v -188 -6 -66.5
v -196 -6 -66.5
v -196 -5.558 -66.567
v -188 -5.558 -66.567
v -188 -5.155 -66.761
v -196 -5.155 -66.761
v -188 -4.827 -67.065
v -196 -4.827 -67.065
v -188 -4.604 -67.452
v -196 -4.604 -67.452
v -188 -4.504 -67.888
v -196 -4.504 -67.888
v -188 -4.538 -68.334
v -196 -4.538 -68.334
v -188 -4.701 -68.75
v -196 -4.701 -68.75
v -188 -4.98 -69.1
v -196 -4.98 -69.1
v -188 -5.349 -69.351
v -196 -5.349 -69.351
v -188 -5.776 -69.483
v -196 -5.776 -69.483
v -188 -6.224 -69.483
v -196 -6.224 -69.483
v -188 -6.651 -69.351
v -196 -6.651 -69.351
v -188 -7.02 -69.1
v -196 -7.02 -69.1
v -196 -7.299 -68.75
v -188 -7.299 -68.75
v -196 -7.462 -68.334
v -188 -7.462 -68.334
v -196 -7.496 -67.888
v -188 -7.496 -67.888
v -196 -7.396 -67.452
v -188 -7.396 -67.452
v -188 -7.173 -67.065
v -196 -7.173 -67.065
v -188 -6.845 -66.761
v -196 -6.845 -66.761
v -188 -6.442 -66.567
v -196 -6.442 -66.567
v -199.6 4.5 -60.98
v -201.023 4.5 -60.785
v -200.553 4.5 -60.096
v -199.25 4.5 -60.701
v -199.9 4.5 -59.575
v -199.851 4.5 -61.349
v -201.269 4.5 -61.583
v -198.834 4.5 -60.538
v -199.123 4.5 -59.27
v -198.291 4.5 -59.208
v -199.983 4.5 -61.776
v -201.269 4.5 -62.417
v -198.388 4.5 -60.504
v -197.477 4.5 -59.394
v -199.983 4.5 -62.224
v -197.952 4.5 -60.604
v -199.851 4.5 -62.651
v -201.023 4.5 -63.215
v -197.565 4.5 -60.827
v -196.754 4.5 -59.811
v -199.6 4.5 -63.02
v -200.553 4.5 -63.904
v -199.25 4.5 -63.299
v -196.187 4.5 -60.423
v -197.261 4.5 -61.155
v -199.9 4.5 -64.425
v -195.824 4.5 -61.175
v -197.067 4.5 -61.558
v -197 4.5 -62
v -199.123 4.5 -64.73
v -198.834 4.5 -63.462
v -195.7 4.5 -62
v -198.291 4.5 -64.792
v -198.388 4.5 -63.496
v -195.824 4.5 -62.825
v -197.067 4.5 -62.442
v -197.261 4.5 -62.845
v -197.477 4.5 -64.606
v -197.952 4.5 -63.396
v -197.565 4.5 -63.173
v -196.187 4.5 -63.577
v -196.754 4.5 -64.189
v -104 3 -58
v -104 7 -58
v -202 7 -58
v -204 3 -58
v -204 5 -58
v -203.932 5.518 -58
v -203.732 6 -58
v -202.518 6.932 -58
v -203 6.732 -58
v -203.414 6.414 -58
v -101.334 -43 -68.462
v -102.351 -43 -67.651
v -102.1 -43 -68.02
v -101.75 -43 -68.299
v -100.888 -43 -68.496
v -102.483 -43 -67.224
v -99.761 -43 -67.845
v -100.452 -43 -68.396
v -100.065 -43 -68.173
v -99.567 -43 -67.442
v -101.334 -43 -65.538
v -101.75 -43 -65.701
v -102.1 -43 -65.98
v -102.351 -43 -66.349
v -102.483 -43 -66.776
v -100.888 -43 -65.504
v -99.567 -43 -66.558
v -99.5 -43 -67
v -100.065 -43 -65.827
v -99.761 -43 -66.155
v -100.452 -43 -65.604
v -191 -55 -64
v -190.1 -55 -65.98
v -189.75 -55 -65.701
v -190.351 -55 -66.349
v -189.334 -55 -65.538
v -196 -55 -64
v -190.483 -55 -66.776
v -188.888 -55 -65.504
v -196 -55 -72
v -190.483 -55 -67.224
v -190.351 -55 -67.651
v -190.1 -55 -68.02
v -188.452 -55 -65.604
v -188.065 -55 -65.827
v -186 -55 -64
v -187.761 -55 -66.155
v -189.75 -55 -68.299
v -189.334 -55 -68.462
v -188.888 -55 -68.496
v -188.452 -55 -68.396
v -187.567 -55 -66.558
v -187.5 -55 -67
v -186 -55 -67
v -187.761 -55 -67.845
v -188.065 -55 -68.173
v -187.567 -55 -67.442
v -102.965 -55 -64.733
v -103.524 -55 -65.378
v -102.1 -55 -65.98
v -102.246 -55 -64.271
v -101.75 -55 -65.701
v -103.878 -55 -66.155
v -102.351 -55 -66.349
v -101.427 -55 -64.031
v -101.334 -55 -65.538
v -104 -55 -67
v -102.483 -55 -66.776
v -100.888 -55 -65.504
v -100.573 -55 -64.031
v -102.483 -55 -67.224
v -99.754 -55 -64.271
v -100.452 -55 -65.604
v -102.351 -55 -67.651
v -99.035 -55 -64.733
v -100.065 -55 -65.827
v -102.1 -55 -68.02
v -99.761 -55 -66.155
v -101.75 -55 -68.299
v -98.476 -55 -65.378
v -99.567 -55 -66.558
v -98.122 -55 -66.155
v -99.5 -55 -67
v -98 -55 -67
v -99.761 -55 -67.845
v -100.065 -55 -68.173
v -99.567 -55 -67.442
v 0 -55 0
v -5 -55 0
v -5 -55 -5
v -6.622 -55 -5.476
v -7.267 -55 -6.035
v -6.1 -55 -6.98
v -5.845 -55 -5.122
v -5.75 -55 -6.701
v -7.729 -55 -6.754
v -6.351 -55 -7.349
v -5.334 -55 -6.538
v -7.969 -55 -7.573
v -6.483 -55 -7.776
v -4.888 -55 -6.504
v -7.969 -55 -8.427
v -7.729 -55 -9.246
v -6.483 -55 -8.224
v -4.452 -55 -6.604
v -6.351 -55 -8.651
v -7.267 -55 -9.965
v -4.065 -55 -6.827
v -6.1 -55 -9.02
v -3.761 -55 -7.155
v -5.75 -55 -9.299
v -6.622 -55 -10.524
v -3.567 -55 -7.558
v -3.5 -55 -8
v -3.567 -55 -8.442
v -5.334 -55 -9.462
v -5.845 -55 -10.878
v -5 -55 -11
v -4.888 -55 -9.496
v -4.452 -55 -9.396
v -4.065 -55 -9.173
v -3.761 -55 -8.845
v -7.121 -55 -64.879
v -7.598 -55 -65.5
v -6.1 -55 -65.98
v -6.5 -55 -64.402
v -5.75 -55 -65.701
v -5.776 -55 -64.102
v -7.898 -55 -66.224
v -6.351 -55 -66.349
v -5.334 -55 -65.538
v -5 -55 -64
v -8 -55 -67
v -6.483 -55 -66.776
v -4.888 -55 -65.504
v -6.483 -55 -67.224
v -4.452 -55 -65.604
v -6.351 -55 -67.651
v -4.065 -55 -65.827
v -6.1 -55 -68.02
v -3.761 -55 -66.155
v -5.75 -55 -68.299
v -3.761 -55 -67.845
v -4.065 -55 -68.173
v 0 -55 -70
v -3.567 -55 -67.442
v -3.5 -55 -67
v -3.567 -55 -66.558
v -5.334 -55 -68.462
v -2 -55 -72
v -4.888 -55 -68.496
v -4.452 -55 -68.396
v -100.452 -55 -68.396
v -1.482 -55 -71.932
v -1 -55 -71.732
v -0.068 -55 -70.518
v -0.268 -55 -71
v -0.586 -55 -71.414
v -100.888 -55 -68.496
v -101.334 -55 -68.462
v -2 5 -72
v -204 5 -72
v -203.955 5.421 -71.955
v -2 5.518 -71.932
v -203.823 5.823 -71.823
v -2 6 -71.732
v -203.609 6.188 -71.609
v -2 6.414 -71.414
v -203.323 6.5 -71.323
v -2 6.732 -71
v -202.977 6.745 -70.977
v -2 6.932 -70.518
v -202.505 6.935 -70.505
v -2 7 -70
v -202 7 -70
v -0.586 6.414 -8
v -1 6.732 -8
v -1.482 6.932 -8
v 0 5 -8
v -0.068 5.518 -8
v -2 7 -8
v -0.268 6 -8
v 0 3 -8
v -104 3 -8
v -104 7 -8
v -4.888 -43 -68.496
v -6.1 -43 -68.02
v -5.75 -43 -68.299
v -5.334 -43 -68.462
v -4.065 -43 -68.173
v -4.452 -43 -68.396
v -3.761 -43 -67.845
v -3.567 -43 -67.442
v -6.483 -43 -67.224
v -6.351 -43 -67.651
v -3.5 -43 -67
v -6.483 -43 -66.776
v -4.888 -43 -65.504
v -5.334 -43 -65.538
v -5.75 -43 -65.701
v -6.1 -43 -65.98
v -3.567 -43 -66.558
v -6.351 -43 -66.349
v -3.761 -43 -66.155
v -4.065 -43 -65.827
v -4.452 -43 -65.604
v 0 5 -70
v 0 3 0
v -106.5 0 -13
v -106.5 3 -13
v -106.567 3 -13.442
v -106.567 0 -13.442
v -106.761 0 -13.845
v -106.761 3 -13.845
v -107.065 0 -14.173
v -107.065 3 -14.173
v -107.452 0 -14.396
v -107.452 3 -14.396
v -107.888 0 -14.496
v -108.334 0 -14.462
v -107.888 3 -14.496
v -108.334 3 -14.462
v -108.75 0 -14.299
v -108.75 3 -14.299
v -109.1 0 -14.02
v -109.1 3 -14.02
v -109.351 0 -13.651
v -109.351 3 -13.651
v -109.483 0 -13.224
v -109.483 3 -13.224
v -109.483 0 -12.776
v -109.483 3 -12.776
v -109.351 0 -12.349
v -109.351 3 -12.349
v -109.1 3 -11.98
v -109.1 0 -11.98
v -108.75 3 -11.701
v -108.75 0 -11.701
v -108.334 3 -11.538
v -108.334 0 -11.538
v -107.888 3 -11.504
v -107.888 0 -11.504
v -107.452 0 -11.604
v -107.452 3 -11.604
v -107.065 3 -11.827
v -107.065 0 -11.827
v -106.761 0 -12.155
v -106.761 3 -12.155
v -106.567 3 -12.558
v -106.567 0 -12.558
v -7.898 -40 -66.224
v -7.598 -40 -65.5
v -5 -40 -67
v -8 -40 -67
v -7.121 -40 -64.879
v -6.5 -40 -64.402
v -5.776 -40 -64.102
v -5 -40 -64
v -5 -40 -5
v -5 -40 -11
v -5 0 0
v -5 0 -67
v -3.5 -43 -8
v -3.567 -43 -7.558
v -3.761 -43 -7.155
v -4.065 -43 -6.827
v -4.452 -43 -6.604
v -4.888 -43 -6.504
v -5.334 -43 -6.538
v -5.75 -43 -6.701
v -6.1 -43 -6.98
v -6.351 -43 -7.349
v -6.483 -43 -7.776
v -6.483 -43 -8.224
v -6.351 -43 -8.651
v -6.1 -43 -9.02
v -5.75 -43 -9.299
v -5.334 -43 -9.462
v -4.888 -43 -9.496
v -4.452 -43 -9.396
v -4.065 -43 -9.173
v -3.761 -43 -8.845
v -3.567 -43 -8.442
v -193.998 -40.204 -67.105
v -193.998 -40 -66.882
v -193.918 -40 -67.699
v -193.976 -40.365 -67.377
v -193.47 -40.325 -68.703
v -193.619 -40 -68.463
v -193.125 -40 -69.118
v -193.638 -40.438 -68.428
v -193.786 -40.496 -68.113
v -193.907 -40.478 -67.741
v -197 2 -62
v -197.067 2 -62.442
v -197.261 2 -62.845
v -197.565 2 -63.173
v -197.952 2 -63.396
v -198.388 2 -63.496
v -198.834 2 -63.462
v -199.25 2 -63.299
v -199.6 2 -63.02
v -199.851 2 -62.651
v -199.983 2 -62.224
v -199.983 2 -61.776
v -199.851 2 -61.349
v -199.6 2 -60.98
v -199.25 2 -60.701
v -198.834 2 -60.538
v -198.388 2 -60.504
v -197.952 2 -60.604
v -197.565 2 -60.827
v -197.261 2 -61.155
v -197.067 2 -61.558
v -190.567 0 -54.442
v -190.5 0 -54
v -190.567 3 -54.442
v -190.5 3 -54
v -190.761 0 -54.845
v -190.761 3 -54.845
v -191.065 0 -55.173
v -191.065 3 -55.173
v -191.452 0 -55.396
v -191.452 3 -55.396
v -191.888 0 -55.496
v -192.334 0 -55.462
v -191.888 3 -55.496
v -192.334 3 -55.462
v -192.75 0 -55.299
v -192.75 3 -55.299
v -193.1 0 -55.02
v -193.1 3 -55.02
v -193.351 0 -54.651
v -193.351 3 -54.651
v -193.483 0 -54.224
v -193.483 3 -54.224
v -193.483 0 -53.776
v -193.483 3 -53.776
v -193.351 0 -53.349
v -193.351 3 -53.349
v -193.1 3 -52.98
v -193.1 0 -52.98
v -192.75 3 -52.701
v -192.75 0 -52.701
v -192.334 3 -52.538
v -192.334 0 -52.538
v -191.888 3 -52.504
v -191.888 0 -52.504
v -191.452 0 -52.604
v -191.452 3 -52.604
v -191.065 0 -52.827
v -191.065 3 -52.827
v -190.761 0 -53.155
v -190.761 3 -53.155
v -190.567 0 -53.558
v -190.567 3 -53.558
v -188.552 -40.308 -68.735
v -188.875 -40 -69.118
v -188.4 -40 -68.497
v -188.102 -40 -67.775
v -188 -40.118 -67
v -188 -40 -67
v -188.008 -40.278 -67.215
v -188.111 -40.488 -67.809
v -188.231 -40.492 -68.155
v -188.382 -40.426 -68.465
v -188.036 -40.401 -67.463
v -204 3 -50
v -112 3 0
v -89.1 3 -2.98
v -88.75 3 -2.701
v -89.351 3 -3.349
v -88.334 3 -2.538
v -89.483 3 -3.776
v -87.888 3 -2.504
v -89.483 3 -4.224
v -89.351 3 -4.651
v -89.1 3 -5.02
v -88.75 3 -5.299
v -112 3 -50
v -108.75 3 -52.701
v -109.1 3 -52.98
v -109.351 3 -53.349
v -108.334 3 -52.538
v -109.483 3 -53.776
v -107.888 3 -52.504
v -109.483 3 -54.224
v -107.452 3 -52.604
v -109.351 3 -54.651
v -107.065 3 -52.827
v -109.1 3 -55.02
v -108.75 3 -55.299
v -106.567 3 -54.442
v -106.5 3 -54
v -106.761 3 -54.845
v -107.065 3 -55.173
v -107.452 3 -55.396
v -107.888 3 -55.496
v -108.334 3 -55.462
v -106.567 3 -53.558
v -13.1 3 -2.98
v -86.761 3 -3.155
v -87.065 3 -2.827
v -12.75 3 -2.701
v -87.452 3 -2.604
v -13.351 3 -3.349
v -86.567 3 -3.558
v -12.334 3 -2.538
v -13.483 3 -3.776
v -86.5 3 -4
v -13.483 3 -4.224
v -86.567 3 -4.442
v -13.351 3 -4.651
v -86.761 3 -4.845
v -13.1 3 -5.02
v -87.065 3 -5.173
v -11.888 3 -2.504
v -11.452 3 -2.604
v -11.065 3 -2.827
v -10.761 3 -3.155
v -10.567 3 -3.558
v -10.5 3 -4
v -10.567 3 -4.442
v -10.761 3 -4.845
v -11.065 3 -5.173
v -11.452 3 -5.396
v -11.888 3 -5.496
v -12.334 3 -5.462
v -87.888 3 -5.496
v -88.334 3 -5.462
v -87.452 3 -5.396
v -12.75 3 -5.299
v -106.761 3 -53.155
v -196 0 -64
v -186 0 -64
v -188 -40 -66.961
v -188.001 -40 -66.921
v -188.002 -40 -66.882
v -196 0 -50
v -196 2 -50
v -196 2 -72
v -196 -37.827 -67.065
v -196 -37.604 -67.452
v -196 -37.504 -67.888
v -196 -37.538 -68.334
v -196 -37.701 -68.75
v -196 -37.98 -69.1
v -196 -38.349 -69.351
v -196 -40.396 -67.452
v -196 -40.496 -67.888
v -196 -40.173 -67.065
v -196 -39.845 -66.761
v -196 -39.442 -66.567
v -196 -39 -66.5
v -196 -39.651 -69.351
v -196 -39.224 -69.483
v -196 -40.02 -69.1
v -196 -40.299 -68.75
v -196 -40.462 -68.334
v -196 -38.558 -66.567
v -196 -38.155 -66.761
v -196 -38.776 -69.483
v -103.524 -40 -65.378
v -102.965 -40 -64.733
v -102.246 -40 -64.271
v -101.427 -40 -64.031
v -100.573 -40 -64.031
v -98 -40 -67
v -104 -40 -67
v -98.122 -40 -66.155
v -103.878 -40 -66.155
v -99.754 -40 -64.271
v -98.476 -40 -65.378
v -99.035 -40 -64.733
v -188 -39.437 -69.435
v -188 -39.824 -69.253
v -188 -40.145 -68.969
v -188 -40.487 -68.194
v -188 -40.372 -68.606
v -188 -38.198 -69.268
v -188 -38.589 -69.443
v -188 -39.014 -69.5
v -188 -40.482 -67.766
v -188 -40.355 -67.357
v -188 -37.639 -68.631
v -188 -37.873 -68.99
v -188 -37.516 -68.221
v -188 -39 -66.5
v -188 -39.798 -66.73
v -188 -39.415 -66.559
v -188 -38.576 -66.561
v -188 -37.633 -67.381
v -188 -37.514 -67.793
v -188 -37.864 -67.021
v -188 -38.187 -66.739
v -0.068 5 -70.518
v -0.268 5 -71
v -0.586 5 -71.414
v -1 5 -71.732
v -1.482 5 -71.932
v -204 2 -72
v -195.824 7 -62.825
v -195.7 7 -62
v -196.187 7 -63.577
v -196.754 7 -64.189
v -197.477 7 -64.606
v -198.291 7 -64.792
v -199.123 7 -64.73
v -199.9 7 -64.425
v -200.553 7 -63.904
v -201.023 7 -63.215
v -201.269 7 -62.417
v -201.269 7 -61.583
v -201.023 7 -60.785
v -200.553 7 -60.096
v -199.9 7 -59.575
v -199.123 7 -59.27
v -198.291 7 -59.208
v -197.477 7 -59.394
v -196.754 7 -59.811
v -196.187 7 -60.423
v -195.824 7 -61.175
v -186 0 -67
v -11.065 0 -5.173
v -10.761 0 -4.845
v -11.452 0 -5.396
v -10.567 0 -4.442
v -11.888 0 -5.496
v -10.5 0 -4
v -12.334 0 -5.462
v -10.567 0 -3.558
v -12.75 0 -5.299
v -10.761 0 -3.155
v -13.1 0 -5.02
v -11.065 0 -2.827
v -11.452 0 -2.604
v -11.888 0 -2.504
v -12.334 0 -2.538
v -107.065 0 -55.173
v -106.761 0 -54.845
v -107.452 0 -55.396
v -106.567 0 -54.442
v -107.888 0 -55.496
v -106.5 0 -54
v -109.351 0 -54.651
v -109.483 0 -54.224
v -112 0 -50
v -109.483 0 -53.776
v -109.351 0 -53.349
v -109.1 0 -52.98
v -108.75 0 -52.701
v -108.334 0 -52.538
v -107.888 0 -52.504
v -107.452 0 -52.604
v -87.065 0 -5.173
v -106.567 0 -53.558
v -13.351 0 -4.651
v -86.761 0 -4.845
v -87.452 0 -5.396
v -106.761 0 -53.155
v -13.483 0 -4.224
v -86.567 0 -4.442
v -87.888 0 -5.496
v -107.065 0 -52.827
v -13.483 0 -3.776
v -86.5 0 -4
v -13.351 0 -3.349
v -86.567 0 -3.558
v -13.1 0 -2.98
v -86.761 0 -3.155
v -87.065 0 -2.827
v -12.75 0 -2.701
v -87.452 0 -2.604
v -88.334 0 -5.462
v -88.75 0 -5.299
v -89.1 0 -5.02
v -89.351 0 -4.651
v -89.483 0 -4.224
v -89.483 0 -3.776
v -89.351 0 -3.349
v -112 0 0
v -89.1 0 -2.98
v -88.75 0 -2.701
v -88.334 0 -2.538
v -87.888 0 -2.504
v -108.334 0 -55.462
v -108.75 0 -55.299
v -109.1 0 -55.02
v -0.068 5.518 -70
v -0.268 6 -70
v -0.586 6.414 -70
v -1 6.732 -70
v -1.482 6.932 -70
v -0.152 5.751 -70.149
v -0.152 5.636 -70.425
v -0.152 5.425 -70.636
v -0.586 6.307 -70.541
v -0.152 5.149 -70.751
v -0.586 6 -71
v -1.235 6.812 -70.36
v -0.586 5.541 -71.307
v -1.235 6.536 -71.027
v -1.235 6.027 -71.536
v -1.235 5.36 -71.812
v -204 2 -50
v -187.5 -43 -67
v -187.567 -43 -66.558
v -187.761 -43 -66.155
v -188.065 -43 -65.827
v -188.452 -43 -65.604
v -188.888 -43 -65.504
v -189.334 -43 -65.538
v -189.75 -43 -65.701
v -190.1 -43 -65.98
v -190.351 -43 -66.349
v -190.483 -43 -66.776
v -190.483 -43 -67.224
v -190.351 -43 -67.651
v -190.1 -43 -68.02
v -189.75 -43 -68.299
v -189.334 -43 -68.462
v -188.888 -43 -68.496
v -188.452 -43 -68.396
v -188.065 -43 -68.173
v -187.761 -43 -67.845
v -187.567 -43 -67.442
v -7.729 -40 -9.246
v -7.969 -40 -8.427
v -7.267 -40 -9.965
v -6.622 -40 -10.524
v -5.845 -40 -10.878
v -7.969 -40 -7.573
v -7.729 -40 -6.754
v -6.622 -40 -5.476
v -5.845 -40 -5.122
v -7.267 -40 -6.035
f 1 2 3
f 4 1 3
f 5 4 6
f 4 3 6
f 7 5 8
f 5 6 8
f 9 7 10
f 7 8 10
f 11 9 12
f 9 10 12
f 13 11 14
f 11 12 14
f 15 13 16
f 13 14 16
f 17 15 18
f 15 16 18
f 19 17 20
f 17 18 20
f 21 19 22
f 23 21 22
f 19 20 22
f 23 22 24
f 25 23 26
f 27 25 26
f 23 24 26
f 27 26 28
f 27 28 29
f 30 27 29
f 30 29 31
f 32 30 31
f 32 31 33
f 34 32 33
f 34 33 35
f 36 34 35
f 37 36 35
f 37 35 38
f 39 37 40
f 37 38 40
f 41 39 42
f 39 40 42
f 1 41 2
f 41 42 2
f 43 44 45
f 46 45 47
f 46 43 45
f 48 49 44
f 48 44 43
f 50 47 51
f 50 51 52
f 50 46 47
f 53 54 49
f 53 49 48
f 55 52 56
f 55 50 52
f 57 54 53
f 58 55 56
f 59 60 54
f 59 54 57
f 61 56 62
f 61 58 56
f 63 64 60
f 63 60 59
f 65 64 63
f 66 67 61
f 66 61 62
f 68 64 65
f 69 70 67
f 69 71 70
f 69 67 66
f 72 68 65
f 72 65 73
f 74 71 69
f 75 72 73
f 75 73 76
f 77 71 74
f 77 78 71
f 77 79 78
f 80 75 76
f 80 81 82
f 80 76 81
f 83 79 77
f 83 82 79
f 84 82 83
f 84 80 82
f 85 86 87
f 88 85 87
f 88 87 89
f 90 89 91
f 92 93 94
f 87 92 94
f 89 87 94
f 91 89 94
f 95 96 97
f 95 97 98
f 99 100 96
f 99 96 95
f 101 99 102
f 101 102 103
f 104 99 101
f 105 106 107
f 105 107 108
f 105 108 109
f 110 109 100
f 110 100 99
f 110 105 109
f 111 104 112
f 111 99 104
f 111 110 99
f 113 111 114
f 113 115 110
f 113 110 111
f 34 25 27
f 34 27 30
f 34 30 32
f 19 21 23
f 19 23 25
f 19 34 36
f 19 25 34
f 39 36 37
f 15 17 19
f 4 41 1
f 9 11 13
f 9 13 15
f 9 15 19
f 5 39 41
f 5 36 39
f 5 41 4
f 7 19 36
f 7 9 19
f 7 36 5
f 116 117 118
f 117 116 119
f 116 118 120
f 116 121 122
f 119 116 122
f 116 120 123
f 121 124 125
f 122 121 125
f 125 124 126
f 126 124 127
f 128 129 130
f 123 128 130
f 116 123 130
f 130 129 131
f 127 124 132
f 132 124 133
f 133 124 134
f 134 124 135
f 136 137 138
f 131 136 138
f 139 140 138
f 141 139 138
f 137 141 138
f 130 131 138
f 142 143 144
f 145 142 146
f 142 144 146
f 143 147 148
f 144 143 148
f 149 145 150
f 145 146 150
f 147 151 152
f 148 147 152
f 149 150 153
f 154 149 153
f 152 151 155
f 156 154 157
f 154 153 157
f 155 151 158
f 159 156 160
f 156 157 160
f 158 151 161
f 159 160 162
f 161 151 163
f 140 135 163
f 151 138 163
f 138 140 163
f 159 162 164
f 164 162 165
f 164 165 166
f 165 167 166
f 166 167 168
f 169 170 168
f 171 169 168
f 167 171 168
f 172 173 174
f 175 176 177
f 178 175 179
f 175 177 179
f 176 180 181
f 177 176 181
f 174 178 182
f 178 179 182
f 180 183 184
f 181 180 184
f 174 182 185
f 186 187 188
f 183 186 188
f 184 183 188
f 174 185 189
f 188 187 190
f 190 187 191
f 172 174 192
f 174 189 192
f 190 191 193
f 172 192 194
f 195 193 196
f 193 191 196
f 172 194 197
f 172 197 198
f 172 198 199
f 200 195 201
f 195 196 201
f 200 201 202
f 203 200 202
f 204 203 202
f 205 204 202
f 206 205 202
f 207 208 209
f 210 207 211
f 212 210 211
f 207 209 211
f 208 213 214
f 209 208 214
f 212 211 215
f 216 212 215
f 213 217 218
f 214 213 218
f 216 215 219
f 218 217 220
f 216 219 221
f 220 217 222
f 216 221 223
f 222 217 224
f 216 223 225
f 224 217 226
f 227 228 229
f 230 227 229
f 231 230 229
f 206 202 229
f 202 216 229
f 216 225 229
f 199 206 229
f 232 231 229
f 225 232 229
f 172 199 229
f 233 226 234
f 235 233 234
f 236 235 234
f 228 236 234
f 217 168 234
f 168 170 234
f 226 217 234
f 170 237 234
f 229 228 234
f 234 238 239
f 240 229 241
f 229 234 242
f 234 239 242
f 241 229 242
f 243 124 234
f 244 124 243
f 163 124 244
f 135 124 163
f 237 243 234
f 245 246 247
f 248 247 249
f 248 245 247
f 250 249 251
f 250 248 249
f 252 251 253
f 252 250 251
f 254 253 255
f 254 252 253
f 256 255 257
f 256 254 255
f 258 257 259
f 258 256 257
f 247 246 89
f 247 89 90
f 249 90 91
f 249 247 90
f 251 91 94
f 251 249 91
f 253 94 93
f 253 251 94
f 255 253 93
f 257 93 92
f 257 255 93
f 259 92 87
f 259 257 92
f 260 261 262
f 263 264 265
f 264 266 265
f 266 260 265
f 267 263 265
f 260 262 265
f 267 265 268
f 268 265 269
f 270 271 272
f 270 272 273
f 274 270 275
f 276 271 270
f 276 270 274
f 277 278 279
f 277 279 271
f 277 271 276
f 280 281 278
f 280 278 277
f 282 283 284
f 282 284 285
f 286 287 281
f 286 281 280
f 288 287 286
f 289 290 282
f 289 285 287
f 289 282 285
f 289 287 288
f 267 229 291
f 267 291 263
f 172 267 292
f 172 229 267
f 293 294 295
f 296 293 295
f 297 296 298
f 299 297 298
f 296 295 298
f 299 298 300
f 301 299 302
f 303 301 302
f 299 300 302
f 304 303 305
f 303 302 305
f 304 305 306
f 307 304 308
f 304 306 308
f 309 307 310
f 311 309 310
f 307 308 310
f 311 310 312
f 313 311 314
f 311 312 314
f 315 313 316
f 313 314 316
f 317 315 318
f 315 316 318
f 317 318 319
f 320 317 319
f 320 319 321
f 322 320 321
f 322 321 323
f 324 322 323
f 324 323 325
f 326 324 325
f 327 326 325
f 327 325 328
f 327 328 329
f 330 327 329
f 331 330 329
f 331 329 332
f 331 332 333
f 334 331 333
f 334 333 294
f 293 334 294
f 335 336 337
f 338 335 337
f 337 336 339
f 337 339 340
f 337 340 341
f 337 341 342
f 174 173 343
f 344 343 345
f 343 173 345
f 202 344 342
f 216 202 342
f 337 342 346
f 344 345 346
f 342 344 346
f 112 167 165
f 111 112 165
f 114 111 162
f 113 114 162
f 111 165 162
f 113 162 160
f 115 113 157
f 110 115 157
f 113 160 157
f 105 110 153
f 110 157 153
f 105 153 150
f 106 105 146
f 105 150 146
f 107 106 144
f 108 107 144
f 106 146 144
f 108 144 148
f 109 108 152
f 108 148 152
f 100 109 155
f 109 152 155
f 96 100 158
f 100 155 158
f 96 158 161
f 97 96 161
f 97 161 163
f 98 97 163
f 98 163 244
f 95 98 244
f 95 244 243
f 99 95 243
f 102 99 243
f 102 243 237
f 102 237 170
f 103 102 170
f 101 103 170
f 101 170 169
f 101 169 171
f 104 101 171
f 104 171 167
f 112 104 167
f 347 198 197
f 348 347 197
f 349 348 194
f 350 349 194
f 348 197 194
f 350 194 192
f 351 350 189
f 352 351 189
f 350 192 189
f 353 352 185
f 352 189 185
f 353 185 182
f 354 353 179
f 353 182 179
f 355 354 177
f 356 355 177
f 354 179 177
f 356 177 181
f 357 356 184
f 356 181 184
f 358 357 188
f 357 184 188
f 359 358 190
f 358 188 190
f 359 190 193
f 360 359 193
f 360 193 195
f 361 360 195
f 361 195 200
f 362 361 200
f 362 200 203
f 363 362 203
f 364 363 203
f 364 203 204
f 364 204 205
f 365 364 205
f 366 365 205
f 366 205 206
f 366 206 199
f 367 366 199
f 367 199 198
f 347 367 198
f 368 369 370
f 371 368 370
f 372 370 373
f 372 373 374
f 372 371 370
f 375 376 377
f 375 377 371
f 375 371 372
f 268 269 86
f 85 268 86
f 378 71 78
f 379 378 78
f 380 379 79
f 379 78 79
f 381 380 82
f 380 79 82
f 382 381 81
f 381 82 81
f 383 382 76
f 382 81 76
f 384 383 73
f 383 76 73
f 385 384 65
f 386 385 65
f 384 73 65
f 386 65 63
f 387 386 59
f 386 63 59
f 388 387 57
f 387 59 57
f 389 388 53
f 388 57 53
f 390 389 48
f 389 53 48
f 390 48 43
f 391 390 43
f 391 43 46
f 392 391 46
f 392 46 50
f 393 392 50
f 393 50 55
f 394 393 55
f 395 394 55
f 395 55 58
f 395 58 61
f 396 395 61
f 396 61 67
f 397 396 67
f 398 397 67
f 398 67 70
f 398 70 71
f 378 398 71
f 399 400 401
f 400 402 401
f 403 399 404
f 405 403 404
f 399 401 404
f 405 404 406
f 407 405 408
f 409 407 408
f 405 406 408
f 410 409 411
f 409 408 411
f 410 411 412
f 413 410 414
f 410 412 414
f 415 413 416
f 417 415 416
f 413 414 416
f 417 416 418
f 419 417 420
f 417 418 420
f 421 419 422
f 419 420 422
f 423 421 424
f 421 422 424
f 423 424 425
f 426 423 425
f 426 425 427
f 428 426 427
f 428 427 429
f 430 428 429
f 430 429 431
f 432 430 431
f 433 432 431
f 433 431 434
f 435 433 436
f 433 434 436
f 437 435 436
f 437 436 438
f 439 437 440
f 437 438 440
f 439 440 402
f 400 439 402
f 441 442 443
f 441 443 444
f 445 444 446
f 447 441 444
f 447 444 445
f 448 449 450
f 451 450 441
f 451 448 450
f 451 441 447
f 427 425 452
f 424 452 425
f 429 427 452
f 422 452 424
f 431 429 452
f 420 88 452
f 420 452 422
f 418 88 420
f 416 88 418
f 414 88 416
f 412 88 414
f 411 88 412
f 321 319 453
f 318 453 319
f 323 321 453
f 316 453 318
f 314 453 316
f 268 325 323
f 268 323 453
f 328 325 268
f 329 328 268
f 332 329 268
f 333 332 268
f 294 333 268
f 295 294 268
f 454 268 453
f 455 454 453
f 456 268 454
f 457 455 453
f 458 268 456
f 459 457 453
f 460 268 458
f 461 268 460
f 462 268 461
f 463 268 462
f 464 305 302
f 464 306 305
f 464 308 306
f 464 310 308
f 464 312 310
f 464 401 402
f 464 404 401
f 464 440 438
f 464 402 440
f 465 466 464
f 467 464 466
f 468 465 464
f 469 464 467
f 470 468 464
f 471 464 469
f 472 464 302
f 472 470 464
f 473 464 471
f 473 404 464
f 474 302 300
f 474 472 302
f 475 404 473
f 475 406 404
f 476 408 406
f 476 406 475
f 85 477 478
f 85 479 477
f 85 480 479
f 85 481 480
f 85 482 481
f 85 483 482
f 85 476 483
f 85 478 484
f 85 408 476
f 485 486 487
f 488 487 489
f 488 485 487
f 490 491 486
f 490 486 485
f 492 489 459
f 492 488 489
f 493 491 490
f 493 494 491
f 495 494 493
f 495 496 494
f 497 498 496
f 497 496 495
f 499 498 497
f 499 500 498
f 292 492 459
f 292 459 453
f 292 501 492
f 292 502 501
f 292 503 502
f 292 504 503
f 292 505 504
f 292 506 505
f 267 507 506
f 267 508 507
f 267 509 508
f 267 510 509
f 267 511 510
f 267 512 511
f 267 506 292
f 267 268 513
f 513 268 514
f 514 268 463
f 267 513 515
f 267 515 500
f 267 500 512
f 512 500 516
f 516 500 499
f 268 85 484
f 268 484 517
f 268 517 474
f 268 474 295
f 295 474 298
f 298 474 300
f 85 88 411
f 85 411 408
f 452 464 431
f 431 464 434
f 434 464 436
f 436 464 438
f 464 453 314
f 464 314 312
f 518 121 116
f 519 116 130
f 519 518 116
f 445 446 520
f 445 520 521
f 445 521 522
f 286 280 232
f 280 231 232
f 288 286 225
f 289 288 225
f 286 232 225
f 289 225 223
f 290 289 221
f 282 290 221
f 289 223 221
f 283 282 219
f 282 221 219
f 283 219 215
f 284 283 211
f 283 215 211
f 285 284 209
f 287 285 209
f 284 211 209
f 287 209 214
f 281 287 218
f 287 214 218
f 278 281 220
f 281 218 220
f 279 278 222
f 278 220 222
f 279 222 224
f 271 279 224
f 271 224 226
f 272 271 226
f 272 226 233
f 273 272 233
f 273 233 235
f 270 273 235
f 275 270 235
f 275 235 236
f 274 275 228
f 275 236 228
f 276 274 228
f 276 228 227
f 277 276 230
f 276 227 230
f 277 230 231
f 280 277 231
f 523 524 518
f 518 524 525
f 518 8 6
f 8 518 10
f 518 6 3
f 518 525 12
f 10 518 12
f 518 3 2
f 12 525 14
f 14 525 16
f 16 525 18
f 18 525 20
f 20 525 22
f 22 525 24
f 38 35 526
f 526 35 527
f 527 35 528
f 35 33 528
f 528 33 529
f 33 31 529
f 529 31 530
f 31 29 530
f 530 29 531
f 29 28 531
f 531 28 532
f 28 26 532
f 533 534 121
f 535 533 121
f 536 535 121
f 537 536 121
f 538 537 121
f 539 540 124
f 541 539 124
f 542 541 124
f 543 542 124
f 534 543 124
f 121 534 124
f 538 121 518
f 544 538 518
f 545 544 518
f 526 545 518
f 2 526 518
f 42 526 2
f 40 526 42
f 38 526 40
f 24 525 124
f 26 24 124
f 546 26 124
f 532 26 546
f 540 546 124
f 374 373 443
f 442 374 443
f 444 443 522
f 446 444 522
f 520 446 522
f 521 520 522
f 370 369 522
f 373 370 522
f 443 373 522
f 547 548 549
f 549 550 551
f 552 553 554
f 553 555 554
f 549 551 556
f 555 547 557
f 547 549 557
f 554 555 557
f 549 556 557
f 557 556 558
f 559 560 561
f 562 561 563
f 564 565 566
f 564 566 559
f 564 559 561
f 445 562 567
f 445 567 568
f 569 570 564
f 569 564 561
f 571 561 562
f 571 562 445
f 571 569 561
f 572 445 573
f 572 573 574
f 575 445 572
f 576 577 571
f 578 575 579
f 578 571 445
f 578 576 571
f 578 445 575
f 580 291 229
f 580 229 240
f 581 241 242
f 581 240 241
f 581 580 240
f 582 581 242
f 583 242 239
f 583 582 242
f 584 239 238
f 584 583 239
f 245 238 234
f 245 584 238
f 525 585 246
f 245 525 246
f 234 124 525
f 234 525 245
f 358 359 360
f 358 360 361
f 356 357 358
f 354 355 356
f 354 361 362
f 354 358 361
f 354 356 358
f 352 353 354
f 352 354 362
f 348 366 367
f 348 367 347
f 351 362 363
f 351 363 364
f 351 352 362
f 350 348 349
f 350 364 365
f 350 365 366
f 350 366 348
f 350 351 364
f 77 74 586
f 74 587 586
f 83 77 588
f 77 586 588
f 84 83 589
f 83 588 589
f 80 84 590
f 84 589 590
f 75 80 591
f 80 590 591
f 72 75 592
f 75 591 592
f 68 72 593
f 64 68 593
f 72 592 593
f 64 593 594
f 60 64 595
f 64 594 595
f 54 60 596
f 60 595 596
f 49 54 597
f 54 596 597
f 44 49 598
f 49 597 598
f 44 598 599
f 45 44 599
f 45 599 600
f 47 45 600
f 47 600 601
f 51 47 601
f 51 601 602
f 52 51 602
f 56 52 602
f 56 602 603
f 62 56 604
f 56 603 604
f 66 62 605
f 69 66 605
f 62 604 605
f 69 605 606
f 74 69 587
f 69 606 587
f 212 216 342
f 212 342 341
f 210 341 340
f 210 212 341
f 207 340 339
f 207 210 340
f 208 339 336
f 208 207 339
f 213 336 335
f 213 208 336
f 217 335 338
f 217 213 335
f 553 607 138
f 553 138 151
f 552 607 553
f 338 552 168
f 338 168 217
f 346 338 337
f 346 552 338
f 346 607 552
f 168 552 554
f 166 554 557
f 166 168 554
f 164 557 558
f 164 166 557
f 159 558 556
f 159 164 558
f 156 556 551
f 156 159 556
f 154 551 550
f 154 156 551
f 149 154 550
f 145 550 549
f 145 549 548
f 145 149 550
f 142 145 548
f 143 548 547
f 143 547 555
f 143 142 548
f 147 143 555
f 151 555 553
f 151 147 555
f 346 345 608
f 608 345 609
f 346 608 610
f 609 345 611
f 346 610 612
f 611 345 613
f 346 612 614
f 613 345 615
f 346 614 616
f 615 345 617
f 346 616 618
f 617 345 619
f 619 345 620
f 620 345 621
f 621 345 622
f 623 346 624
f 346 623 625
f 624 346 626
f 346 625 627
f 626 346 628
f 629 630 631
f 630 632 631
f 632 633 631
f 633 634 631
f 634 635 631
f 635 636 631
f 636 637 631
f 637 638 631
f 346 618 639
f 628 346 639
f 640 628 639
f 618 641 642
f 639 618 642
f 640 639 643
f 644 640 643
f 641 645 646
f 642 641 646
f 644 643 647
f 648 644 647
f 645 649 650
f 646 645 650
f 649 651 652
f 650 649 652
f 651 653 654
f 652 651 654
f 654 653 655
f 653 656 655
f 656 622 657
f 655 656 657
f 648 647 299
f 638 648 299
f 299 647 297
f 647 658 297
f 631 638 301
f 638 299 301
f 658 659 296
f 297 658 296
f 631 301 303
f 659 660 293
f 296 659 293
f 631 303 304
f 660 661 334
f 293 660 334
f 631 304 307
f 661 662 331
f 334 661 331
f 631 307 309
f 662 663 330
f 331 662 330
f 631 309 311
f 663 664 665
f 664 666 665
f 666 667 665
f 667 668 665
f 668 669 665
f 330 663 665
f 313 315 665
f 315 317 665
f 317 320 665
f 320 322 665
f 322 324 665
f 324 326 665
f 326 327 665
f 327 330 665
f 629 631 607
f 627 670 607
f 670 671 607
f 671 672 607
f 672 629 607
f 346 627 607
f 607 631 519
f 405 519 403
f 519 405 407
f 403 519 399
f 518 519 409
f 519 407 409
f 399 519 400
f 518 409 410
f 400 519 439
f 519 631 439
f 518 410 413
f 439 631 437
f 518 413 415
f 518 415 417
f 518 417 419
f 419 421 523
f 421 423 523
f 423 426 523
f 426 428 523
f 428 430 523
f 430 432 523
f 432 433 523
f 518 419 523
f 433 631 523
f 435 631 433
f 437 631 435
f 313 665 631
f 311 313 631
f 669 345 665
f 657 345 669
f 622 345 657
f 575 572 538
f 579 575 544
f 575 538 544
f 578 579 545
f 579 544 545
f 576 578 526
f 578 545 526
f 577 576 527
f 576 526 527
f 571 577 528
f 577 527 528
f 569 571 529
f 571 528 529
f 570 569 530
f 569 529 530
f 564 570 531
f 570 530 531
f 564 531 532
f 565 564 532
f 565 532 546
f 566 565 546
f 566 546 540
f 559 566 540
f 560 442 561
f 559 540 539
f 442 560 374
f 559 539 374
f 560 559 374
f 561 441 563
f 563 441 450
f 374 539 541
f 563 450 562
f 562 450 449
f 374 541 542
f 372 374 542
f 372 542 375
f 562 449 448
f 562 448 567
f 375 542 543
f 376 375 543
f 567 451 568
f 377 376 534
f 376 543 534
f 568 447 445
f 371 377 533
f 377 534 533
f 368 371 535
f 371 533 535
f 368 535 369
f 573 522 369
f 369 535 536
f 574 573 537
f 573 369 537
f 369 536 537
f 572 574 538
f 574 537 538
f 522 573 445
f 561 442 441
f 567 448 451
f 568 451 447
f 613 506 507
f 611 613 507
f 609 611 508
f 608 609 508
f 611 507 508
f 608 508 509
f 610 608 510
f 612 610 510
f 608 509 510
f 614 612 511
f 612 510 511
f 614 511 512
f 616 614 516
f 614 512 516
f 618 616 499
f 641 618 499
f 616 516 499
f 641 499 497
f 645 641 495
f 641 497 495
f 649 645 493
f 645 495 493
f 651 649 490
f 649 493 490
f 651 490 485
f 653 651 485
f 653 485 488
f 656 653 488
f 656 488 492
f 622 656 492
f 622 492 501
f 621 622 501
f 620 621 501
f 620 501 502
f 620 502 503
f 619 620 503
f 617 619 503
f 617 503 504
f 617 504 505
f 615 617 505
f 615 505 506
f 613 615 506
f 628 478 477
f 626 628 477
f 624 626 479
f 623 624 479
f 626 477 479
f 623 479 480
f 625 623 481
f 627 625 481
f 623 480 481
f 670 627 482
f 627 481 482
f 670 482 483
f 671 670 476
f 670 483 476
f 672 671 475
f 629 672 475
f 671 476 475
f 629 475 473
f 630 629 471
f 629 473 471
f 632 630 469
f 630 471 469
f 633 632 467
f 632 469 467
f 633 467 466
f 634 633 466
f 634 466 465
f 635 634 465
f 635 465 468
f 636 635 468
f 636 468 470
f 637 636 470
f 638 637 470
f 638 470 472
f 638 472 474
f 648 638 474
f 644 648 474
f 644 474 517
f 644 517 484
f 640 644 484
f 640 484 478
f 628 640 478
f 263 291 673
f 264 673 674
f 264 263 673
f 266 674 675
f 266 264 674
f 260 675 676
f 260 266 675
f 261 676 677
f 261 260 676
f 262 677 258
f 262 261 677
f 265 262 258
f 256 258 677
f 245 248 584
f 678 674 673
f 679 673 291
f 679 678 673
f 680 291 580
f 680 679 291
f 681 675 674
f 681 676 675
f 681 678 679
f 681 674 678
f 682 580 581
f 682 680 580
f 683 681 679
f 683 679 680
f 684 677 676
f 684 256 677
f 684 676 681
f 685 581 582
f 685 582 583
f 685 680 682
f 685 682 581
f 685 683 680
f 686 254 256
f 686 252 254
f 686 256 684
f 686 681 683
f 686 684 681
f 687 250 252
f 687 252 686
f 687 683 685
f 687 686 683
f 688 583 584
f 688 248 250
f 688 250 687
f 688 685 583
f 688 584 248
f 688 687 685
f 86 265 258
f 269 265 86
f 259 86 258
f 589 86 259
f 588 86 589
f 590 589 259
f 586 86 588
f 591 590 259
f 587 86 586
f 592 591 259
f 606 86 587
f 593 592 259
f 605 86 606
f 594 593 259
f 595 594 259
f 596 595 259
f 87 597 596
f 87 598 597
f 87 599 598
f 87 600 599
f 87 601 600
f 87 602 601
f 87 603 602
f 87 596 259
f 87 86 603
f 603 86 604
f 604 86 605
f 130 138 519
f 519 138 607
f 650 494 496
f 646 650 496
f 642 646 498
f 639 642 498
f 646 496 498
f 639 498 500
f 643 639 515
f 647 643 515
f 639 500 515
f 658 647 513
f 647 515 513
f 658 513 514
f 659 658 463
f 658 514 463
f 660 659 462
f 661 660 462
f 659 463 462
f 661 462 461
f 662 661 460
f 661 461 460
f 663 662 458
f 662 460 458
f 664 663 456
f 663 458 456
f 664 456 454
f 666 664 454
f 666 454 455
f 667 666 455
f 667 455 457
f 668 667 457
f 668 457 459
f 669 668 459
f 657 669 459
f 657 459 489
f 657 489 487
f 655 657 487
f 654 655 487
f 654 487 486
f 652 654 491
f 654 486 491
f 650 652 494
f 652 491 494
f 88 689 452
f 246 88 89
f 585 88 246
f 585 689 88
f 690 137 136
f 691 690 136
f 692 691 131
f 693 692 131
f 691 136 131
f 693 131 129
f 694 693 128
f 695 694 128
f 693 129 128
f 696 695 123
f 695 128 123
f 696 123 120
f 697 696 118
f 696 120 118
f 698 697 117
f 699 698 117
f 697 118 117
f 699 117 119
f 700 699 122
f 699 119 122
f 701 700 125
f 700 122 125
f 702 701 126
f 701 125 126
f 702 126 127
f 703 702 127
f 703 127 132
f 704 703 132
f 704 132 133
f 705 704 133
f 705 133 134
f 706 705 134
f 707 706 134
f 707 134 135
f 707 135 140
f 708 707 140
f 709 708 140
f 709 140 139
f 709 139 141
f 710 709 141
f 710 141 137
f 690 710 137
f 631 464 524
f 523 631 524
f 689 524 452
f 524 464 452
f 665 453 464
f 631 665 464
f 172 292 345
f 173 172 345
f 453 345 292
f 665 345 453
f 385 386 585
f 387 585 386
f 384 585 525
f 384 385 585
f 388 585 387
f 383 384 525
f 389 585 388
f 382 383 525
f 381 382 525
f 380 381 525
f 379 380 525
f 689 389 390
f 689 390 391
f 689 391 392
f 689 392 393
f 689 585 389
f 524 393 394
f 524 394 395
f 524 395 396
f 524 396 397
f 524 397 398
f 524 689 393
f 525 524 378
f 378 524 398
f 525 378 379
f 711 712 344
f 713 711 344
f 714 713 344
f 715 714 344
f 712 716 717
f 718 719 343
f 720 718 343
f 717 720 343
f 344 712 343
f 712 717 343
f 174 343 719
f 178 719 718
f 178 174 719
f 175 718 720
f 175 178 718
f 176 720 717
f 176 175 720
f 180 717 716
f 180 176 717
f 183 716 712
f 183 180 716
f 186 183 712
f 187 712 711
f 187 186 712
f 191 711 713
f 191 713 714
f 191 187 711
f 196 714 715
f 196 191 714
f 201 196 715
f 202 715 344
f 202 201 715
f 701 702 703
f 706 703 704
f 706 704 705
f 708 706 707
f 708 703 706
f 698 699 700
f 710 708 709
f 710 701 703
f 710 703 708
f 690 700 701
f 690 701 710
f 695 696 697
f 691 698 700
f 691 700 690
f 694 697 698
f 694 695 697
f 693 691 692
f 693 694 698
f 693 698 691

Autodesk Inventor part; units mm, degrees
ref_plane "YZ Plane" through (0, 0, 0) normal (1, 0, 0) x (0, 1, 0)
ref_plane "XZ Plane" through (0, 0, 0) normal (0, 1, 0) x (-1, 0, 0)
ref_plane "XY Plane" through (0, 0, 0) normal (0, 0, 1) x (1, 0, 0)
sketch "スケッチ1" plane through (0, 0, 0) normal (0, 1, 0) x (-1, 0, 0)
  line L0 (0, 0) -> (204, 0)
  line L1 (204, 0) -> (204, -72)
  line L2 (204, -72) -> (0, -72)
  line L3 (0, -72) -> (0, 0)
  dimension "d0" = 204
  dimension "d1" = 72
extrude "押し出し1" add sketch "スケッチ1" along normal blind 7
sketch "スケッチ2" plane through (0, 7, 0) normal (0, 1, 0) x (1, 0, 0)
  line L0 (-204, 72) -> (-204, 0) projected
  line L1 (-204, 0) -> (-112, 0)
  line L2 (-112, 0) -> (-112, 50)
  line L3 (-112, 50) -> (-204, 50)
  line L4 (-204, 50) -> (-204, 0)
  point P0 (0, 0)
  dimension "d4" = 92
  dimension "d5" = 50
extrude "押し出し2" cut sketch "スケッチ2" against normal through all
sketch "スケッチ3" plane through (0, 7, 0) normal (0, 1, 0) x (1, 0, 0)
  line L0 (-112, 0) -> (0, 0) projected
  line L1 (0, 0) -> (0, 72) projected
  line L2 (-112, 0) -> (0, 0)
  line L3 (0, 0) -> (0, 8)
  line L4 (0, 8) -> (-112, 8)
  line L5 (-112, 8) -> (-112, 0)
  line L6 (-112, 0) -> (-104, 0)
  line L7 (-104, 0) -> (-104, 58)
  line L8 (-104, 58) -> (-112, 58)
  line L9 (-112, 58) -> (-112, 0)
  line L10 (-204, 72) -> (-204, 50) projected
  line L11 (-204, 50) -> (-104, 50)
  line L12 (-104, 50) -> (-104, 58)
  line L13 (-104, 58) -> (-204, 58)
  line L14 (-204, 58) -> (-204, 50)
  point P0 (-112, 50)
  point P1 (-112, 8)
  point P2 (-104, 8)
  dimension "d8" = 8
  dimension "d11" = 8
  dimension "d12" = 8
extrude "押し出し3" cut sketch "スケッチ3" against normal blind 4
sketch "スケッチ4" plane through (0, 3, 0) normal (0, 1, 0) x (1, 0, 0)
  circle A0 centre (-192, 54) radius 1.5
  circle A1 centre (-108, 54) radius 1.5
  circle A2 centre (-108, 13) radius 1.5
  circle A3 centre (-12, 4) radius 1.5
  circle A4 centre (-88, 4) radius 1.5
  line L0 (-204, 50) -> (-204, 58) projected
  line L1 (0, 8) -> (0, 0) projected
  line L2 (-112, 0) -> (-112, 50) projected
  point P0 (-204, 54)
  point P1 (-204, 54)
  point P2 (0, 4)
  point P3 (0, 4)
  dimension "d13" = 3
  dimension "d14" = 3
  dimension "d15" = 3
  dimension "d16" = 3
  dimension "d17" = 3
  dimension "d18" = 12
  dimension "d19" = 12
  dimension "d20" = 24
  dimension "d21" = 4
  dimension "d22" = 41
extrude "押し出し4" cut sketch "スケッチ4" against normal through all
sketch "スケッチ5" plane through (0, 0, 0) normal (0, -1, 0) x (1, 0, 0)
  line L0 (-112, -50) -> (-204, -50) projected
  line L1 (0, -72) -> (-204, -72) projected
  line L2 (-204, -50) -> (-196, -50)
  line L3 (-196, -50) -> (-196, -72)
  line L4 (-196, -72) -> (-204, -72)
  line L5 (-204, -72) -> (-204, -50)
  point P0 (0, 0)
  point P1 (-204, -72)
  dimension "d25" = 8
extrude "押し出し5" cut sketch "スケッチ5" against normal blind 2
sketch "スケッチ6" plane through (0, 0, 0) normal (0, -1, 0) x (1, 0, 0)
  line L0 (0, -72) -> (-204, -72) projected
  line L1 (-196, -50) -> (-196, -72) projected
  line L2 (0, -72) -> (-196, -72)
  line L3 (-196, -72) -> (-196, -67)
  line L4 (-196, -67) -> (0, -67)
  line L5 (0, -67) -> (0, -72)
  line L6 (0, 0) -> (-5, 0)
  line L7 (-5, 0) -> (-5, -72)
  line L8 (-5, -72) -> (0, -72)
  line L9 (0, -72) -> (0, 0)
  point P0 (-5, -67)
  dimension "d28" = 5
  dimension "d29" = 5
extrude "押し出し6" add sketch "スケッチ6" along normal blind 55
sketch "スケッチ7" plane through (-196, 0, -67) normal (0, 0, 1) x (1, 0, 0)
  line L0 (0, 2) -> (0, -55) projected
  line L1 (0, 0) -> (191, 0) projected
  line L2 (0, -55) -> (10, -55)
  line L3 (10, -55) -> (10, 0)
  line L4 (10, 0) -> (0, 0)
  line L5 (0, 0) -> (0, -55)
  point P0 (196, 0)
  dimension "d32" = 10
extrude "押し出し7" add sketch "スケッチ7" along normal blind 3
sketch "スケッチ8" plane through (-196, 2, -72) normal (-1, 0, 0) x (0, 0, 1)
  circle A0 centre (4, -41) radius 1.5
  circle A1 centre (4, -8) radius 1.5
  line L0 (0, -57) -> (8, -57) projected
  line L1 (0, 0) -> (22, 0) projected
  point P0 (72, -2)
  point P1 (4, -57)
  point P2 (4, -57)
  point P3 (4, -57)
  dimension "d35" = 3
  dimension "d36" = 3
  dimension "d37" = 16
  dimension "d38" = 8
extrude "押し出し8" cut sketch "スケッチ8" against normal blind 8
sketch "スケッチ9" plane through (0, -55, 0) normal (0, -1, 0) x (1, 0, 0)
  line L0 (-5, -67) -> (-5, 0) projected
  circle A0 centre (-5, -8) radius 3
  circle A1 centre (-5, -67) radius 3
  line L1 (-186, -67) -> (-5, -67) projected
  circle A2 centre (-101, -67) radius 3
  circle A3 centre (-191, -67) radius 3
  line L2 (0, 0) -> (-5, 0) projected
  dimension "d41" = 6
  dimension "d42" = 6
  dimension "d43" = 6
  dimension "d44" = 6
  dimension "d46" = 96
  dimension "d47" = 90
  dimension "d73" = 8
extrude "押し出し9" add sketch "スケッチ9" against normal blind 15
sketch "スケッチ10" plane through (0, -55, 0) normal (0, -1, 0) x (1, 0, 0)
  arc A0 (-5, -5) -> (-5, -11) centre (-5, -8) ccw projected
  circle A1 centre (-5, -8) radius 1.5
  arc A2 (-5, -64) -> (-8, -67) centre (-5, -67) ccw projected
  circle A3 centre (-5, -67) radius 1.5
  arc A4 (-98, -67) -> (-104, -67) centre (-101, -67) ccw projected
  circle A5 centre (-101, -67) radius 1.5
  circle A6 centre (-189, -67) radius 1.5
  line L0 (-186, -67) -> (-186, -64) projected
  line L1 (-196, -64) -> (-186, -64) projected
  dimension "d50" = 3
  dimension "d51" = 3
  dimension "d52" = 3
  dimension "d58" = 3
  dimension "d59" = 3
  dimension "d60" = 3
extrude "押し出し10" cut sketch "スケッチ10" against normal blind 12
sketch "スケッチ11" plane through (0, 7, 0) normal (0, 1, 0) x (1, 0, 0)
  circle A0 centre (-198.5, 62) radius 1.5
  line L0 (-204, 72) -> (-204, 58) projected
  line L1 (0, 72) -> (-204, 72) projected
  line L2 (-204, 58) -> (-104, 58) projected
  point P0 (0, 0)
  dimension "d61" = 3
  dimension "d63" = 5.5
  dimension "d75" = 4
extrude "押し出し11" cut sketch "スケッチ11" against normal through all
sketch "スケッチ12" plane through (0, 7, 0) normal (0, 1, 0) x (1, 0, 0)
  circle A0 centre (-198.5, 62) radius 2.8
  circle A1 centre (-198.5, 62) radius 1.5 projected
  point P0 (0, 0)
  dimension "d68" = 5.6
extrude "押し出し12" cut sketch "スケッチ12" against normal blind 2.5 contours A0 | A1
fillet "フィレット1" radius 2 4 edges at (-204, 7, -65) (-102, 7, -72) (0, 7, -40) (0, -24, -72)
properties part number "オンゲキボタン_top_right2_3D プリント"
